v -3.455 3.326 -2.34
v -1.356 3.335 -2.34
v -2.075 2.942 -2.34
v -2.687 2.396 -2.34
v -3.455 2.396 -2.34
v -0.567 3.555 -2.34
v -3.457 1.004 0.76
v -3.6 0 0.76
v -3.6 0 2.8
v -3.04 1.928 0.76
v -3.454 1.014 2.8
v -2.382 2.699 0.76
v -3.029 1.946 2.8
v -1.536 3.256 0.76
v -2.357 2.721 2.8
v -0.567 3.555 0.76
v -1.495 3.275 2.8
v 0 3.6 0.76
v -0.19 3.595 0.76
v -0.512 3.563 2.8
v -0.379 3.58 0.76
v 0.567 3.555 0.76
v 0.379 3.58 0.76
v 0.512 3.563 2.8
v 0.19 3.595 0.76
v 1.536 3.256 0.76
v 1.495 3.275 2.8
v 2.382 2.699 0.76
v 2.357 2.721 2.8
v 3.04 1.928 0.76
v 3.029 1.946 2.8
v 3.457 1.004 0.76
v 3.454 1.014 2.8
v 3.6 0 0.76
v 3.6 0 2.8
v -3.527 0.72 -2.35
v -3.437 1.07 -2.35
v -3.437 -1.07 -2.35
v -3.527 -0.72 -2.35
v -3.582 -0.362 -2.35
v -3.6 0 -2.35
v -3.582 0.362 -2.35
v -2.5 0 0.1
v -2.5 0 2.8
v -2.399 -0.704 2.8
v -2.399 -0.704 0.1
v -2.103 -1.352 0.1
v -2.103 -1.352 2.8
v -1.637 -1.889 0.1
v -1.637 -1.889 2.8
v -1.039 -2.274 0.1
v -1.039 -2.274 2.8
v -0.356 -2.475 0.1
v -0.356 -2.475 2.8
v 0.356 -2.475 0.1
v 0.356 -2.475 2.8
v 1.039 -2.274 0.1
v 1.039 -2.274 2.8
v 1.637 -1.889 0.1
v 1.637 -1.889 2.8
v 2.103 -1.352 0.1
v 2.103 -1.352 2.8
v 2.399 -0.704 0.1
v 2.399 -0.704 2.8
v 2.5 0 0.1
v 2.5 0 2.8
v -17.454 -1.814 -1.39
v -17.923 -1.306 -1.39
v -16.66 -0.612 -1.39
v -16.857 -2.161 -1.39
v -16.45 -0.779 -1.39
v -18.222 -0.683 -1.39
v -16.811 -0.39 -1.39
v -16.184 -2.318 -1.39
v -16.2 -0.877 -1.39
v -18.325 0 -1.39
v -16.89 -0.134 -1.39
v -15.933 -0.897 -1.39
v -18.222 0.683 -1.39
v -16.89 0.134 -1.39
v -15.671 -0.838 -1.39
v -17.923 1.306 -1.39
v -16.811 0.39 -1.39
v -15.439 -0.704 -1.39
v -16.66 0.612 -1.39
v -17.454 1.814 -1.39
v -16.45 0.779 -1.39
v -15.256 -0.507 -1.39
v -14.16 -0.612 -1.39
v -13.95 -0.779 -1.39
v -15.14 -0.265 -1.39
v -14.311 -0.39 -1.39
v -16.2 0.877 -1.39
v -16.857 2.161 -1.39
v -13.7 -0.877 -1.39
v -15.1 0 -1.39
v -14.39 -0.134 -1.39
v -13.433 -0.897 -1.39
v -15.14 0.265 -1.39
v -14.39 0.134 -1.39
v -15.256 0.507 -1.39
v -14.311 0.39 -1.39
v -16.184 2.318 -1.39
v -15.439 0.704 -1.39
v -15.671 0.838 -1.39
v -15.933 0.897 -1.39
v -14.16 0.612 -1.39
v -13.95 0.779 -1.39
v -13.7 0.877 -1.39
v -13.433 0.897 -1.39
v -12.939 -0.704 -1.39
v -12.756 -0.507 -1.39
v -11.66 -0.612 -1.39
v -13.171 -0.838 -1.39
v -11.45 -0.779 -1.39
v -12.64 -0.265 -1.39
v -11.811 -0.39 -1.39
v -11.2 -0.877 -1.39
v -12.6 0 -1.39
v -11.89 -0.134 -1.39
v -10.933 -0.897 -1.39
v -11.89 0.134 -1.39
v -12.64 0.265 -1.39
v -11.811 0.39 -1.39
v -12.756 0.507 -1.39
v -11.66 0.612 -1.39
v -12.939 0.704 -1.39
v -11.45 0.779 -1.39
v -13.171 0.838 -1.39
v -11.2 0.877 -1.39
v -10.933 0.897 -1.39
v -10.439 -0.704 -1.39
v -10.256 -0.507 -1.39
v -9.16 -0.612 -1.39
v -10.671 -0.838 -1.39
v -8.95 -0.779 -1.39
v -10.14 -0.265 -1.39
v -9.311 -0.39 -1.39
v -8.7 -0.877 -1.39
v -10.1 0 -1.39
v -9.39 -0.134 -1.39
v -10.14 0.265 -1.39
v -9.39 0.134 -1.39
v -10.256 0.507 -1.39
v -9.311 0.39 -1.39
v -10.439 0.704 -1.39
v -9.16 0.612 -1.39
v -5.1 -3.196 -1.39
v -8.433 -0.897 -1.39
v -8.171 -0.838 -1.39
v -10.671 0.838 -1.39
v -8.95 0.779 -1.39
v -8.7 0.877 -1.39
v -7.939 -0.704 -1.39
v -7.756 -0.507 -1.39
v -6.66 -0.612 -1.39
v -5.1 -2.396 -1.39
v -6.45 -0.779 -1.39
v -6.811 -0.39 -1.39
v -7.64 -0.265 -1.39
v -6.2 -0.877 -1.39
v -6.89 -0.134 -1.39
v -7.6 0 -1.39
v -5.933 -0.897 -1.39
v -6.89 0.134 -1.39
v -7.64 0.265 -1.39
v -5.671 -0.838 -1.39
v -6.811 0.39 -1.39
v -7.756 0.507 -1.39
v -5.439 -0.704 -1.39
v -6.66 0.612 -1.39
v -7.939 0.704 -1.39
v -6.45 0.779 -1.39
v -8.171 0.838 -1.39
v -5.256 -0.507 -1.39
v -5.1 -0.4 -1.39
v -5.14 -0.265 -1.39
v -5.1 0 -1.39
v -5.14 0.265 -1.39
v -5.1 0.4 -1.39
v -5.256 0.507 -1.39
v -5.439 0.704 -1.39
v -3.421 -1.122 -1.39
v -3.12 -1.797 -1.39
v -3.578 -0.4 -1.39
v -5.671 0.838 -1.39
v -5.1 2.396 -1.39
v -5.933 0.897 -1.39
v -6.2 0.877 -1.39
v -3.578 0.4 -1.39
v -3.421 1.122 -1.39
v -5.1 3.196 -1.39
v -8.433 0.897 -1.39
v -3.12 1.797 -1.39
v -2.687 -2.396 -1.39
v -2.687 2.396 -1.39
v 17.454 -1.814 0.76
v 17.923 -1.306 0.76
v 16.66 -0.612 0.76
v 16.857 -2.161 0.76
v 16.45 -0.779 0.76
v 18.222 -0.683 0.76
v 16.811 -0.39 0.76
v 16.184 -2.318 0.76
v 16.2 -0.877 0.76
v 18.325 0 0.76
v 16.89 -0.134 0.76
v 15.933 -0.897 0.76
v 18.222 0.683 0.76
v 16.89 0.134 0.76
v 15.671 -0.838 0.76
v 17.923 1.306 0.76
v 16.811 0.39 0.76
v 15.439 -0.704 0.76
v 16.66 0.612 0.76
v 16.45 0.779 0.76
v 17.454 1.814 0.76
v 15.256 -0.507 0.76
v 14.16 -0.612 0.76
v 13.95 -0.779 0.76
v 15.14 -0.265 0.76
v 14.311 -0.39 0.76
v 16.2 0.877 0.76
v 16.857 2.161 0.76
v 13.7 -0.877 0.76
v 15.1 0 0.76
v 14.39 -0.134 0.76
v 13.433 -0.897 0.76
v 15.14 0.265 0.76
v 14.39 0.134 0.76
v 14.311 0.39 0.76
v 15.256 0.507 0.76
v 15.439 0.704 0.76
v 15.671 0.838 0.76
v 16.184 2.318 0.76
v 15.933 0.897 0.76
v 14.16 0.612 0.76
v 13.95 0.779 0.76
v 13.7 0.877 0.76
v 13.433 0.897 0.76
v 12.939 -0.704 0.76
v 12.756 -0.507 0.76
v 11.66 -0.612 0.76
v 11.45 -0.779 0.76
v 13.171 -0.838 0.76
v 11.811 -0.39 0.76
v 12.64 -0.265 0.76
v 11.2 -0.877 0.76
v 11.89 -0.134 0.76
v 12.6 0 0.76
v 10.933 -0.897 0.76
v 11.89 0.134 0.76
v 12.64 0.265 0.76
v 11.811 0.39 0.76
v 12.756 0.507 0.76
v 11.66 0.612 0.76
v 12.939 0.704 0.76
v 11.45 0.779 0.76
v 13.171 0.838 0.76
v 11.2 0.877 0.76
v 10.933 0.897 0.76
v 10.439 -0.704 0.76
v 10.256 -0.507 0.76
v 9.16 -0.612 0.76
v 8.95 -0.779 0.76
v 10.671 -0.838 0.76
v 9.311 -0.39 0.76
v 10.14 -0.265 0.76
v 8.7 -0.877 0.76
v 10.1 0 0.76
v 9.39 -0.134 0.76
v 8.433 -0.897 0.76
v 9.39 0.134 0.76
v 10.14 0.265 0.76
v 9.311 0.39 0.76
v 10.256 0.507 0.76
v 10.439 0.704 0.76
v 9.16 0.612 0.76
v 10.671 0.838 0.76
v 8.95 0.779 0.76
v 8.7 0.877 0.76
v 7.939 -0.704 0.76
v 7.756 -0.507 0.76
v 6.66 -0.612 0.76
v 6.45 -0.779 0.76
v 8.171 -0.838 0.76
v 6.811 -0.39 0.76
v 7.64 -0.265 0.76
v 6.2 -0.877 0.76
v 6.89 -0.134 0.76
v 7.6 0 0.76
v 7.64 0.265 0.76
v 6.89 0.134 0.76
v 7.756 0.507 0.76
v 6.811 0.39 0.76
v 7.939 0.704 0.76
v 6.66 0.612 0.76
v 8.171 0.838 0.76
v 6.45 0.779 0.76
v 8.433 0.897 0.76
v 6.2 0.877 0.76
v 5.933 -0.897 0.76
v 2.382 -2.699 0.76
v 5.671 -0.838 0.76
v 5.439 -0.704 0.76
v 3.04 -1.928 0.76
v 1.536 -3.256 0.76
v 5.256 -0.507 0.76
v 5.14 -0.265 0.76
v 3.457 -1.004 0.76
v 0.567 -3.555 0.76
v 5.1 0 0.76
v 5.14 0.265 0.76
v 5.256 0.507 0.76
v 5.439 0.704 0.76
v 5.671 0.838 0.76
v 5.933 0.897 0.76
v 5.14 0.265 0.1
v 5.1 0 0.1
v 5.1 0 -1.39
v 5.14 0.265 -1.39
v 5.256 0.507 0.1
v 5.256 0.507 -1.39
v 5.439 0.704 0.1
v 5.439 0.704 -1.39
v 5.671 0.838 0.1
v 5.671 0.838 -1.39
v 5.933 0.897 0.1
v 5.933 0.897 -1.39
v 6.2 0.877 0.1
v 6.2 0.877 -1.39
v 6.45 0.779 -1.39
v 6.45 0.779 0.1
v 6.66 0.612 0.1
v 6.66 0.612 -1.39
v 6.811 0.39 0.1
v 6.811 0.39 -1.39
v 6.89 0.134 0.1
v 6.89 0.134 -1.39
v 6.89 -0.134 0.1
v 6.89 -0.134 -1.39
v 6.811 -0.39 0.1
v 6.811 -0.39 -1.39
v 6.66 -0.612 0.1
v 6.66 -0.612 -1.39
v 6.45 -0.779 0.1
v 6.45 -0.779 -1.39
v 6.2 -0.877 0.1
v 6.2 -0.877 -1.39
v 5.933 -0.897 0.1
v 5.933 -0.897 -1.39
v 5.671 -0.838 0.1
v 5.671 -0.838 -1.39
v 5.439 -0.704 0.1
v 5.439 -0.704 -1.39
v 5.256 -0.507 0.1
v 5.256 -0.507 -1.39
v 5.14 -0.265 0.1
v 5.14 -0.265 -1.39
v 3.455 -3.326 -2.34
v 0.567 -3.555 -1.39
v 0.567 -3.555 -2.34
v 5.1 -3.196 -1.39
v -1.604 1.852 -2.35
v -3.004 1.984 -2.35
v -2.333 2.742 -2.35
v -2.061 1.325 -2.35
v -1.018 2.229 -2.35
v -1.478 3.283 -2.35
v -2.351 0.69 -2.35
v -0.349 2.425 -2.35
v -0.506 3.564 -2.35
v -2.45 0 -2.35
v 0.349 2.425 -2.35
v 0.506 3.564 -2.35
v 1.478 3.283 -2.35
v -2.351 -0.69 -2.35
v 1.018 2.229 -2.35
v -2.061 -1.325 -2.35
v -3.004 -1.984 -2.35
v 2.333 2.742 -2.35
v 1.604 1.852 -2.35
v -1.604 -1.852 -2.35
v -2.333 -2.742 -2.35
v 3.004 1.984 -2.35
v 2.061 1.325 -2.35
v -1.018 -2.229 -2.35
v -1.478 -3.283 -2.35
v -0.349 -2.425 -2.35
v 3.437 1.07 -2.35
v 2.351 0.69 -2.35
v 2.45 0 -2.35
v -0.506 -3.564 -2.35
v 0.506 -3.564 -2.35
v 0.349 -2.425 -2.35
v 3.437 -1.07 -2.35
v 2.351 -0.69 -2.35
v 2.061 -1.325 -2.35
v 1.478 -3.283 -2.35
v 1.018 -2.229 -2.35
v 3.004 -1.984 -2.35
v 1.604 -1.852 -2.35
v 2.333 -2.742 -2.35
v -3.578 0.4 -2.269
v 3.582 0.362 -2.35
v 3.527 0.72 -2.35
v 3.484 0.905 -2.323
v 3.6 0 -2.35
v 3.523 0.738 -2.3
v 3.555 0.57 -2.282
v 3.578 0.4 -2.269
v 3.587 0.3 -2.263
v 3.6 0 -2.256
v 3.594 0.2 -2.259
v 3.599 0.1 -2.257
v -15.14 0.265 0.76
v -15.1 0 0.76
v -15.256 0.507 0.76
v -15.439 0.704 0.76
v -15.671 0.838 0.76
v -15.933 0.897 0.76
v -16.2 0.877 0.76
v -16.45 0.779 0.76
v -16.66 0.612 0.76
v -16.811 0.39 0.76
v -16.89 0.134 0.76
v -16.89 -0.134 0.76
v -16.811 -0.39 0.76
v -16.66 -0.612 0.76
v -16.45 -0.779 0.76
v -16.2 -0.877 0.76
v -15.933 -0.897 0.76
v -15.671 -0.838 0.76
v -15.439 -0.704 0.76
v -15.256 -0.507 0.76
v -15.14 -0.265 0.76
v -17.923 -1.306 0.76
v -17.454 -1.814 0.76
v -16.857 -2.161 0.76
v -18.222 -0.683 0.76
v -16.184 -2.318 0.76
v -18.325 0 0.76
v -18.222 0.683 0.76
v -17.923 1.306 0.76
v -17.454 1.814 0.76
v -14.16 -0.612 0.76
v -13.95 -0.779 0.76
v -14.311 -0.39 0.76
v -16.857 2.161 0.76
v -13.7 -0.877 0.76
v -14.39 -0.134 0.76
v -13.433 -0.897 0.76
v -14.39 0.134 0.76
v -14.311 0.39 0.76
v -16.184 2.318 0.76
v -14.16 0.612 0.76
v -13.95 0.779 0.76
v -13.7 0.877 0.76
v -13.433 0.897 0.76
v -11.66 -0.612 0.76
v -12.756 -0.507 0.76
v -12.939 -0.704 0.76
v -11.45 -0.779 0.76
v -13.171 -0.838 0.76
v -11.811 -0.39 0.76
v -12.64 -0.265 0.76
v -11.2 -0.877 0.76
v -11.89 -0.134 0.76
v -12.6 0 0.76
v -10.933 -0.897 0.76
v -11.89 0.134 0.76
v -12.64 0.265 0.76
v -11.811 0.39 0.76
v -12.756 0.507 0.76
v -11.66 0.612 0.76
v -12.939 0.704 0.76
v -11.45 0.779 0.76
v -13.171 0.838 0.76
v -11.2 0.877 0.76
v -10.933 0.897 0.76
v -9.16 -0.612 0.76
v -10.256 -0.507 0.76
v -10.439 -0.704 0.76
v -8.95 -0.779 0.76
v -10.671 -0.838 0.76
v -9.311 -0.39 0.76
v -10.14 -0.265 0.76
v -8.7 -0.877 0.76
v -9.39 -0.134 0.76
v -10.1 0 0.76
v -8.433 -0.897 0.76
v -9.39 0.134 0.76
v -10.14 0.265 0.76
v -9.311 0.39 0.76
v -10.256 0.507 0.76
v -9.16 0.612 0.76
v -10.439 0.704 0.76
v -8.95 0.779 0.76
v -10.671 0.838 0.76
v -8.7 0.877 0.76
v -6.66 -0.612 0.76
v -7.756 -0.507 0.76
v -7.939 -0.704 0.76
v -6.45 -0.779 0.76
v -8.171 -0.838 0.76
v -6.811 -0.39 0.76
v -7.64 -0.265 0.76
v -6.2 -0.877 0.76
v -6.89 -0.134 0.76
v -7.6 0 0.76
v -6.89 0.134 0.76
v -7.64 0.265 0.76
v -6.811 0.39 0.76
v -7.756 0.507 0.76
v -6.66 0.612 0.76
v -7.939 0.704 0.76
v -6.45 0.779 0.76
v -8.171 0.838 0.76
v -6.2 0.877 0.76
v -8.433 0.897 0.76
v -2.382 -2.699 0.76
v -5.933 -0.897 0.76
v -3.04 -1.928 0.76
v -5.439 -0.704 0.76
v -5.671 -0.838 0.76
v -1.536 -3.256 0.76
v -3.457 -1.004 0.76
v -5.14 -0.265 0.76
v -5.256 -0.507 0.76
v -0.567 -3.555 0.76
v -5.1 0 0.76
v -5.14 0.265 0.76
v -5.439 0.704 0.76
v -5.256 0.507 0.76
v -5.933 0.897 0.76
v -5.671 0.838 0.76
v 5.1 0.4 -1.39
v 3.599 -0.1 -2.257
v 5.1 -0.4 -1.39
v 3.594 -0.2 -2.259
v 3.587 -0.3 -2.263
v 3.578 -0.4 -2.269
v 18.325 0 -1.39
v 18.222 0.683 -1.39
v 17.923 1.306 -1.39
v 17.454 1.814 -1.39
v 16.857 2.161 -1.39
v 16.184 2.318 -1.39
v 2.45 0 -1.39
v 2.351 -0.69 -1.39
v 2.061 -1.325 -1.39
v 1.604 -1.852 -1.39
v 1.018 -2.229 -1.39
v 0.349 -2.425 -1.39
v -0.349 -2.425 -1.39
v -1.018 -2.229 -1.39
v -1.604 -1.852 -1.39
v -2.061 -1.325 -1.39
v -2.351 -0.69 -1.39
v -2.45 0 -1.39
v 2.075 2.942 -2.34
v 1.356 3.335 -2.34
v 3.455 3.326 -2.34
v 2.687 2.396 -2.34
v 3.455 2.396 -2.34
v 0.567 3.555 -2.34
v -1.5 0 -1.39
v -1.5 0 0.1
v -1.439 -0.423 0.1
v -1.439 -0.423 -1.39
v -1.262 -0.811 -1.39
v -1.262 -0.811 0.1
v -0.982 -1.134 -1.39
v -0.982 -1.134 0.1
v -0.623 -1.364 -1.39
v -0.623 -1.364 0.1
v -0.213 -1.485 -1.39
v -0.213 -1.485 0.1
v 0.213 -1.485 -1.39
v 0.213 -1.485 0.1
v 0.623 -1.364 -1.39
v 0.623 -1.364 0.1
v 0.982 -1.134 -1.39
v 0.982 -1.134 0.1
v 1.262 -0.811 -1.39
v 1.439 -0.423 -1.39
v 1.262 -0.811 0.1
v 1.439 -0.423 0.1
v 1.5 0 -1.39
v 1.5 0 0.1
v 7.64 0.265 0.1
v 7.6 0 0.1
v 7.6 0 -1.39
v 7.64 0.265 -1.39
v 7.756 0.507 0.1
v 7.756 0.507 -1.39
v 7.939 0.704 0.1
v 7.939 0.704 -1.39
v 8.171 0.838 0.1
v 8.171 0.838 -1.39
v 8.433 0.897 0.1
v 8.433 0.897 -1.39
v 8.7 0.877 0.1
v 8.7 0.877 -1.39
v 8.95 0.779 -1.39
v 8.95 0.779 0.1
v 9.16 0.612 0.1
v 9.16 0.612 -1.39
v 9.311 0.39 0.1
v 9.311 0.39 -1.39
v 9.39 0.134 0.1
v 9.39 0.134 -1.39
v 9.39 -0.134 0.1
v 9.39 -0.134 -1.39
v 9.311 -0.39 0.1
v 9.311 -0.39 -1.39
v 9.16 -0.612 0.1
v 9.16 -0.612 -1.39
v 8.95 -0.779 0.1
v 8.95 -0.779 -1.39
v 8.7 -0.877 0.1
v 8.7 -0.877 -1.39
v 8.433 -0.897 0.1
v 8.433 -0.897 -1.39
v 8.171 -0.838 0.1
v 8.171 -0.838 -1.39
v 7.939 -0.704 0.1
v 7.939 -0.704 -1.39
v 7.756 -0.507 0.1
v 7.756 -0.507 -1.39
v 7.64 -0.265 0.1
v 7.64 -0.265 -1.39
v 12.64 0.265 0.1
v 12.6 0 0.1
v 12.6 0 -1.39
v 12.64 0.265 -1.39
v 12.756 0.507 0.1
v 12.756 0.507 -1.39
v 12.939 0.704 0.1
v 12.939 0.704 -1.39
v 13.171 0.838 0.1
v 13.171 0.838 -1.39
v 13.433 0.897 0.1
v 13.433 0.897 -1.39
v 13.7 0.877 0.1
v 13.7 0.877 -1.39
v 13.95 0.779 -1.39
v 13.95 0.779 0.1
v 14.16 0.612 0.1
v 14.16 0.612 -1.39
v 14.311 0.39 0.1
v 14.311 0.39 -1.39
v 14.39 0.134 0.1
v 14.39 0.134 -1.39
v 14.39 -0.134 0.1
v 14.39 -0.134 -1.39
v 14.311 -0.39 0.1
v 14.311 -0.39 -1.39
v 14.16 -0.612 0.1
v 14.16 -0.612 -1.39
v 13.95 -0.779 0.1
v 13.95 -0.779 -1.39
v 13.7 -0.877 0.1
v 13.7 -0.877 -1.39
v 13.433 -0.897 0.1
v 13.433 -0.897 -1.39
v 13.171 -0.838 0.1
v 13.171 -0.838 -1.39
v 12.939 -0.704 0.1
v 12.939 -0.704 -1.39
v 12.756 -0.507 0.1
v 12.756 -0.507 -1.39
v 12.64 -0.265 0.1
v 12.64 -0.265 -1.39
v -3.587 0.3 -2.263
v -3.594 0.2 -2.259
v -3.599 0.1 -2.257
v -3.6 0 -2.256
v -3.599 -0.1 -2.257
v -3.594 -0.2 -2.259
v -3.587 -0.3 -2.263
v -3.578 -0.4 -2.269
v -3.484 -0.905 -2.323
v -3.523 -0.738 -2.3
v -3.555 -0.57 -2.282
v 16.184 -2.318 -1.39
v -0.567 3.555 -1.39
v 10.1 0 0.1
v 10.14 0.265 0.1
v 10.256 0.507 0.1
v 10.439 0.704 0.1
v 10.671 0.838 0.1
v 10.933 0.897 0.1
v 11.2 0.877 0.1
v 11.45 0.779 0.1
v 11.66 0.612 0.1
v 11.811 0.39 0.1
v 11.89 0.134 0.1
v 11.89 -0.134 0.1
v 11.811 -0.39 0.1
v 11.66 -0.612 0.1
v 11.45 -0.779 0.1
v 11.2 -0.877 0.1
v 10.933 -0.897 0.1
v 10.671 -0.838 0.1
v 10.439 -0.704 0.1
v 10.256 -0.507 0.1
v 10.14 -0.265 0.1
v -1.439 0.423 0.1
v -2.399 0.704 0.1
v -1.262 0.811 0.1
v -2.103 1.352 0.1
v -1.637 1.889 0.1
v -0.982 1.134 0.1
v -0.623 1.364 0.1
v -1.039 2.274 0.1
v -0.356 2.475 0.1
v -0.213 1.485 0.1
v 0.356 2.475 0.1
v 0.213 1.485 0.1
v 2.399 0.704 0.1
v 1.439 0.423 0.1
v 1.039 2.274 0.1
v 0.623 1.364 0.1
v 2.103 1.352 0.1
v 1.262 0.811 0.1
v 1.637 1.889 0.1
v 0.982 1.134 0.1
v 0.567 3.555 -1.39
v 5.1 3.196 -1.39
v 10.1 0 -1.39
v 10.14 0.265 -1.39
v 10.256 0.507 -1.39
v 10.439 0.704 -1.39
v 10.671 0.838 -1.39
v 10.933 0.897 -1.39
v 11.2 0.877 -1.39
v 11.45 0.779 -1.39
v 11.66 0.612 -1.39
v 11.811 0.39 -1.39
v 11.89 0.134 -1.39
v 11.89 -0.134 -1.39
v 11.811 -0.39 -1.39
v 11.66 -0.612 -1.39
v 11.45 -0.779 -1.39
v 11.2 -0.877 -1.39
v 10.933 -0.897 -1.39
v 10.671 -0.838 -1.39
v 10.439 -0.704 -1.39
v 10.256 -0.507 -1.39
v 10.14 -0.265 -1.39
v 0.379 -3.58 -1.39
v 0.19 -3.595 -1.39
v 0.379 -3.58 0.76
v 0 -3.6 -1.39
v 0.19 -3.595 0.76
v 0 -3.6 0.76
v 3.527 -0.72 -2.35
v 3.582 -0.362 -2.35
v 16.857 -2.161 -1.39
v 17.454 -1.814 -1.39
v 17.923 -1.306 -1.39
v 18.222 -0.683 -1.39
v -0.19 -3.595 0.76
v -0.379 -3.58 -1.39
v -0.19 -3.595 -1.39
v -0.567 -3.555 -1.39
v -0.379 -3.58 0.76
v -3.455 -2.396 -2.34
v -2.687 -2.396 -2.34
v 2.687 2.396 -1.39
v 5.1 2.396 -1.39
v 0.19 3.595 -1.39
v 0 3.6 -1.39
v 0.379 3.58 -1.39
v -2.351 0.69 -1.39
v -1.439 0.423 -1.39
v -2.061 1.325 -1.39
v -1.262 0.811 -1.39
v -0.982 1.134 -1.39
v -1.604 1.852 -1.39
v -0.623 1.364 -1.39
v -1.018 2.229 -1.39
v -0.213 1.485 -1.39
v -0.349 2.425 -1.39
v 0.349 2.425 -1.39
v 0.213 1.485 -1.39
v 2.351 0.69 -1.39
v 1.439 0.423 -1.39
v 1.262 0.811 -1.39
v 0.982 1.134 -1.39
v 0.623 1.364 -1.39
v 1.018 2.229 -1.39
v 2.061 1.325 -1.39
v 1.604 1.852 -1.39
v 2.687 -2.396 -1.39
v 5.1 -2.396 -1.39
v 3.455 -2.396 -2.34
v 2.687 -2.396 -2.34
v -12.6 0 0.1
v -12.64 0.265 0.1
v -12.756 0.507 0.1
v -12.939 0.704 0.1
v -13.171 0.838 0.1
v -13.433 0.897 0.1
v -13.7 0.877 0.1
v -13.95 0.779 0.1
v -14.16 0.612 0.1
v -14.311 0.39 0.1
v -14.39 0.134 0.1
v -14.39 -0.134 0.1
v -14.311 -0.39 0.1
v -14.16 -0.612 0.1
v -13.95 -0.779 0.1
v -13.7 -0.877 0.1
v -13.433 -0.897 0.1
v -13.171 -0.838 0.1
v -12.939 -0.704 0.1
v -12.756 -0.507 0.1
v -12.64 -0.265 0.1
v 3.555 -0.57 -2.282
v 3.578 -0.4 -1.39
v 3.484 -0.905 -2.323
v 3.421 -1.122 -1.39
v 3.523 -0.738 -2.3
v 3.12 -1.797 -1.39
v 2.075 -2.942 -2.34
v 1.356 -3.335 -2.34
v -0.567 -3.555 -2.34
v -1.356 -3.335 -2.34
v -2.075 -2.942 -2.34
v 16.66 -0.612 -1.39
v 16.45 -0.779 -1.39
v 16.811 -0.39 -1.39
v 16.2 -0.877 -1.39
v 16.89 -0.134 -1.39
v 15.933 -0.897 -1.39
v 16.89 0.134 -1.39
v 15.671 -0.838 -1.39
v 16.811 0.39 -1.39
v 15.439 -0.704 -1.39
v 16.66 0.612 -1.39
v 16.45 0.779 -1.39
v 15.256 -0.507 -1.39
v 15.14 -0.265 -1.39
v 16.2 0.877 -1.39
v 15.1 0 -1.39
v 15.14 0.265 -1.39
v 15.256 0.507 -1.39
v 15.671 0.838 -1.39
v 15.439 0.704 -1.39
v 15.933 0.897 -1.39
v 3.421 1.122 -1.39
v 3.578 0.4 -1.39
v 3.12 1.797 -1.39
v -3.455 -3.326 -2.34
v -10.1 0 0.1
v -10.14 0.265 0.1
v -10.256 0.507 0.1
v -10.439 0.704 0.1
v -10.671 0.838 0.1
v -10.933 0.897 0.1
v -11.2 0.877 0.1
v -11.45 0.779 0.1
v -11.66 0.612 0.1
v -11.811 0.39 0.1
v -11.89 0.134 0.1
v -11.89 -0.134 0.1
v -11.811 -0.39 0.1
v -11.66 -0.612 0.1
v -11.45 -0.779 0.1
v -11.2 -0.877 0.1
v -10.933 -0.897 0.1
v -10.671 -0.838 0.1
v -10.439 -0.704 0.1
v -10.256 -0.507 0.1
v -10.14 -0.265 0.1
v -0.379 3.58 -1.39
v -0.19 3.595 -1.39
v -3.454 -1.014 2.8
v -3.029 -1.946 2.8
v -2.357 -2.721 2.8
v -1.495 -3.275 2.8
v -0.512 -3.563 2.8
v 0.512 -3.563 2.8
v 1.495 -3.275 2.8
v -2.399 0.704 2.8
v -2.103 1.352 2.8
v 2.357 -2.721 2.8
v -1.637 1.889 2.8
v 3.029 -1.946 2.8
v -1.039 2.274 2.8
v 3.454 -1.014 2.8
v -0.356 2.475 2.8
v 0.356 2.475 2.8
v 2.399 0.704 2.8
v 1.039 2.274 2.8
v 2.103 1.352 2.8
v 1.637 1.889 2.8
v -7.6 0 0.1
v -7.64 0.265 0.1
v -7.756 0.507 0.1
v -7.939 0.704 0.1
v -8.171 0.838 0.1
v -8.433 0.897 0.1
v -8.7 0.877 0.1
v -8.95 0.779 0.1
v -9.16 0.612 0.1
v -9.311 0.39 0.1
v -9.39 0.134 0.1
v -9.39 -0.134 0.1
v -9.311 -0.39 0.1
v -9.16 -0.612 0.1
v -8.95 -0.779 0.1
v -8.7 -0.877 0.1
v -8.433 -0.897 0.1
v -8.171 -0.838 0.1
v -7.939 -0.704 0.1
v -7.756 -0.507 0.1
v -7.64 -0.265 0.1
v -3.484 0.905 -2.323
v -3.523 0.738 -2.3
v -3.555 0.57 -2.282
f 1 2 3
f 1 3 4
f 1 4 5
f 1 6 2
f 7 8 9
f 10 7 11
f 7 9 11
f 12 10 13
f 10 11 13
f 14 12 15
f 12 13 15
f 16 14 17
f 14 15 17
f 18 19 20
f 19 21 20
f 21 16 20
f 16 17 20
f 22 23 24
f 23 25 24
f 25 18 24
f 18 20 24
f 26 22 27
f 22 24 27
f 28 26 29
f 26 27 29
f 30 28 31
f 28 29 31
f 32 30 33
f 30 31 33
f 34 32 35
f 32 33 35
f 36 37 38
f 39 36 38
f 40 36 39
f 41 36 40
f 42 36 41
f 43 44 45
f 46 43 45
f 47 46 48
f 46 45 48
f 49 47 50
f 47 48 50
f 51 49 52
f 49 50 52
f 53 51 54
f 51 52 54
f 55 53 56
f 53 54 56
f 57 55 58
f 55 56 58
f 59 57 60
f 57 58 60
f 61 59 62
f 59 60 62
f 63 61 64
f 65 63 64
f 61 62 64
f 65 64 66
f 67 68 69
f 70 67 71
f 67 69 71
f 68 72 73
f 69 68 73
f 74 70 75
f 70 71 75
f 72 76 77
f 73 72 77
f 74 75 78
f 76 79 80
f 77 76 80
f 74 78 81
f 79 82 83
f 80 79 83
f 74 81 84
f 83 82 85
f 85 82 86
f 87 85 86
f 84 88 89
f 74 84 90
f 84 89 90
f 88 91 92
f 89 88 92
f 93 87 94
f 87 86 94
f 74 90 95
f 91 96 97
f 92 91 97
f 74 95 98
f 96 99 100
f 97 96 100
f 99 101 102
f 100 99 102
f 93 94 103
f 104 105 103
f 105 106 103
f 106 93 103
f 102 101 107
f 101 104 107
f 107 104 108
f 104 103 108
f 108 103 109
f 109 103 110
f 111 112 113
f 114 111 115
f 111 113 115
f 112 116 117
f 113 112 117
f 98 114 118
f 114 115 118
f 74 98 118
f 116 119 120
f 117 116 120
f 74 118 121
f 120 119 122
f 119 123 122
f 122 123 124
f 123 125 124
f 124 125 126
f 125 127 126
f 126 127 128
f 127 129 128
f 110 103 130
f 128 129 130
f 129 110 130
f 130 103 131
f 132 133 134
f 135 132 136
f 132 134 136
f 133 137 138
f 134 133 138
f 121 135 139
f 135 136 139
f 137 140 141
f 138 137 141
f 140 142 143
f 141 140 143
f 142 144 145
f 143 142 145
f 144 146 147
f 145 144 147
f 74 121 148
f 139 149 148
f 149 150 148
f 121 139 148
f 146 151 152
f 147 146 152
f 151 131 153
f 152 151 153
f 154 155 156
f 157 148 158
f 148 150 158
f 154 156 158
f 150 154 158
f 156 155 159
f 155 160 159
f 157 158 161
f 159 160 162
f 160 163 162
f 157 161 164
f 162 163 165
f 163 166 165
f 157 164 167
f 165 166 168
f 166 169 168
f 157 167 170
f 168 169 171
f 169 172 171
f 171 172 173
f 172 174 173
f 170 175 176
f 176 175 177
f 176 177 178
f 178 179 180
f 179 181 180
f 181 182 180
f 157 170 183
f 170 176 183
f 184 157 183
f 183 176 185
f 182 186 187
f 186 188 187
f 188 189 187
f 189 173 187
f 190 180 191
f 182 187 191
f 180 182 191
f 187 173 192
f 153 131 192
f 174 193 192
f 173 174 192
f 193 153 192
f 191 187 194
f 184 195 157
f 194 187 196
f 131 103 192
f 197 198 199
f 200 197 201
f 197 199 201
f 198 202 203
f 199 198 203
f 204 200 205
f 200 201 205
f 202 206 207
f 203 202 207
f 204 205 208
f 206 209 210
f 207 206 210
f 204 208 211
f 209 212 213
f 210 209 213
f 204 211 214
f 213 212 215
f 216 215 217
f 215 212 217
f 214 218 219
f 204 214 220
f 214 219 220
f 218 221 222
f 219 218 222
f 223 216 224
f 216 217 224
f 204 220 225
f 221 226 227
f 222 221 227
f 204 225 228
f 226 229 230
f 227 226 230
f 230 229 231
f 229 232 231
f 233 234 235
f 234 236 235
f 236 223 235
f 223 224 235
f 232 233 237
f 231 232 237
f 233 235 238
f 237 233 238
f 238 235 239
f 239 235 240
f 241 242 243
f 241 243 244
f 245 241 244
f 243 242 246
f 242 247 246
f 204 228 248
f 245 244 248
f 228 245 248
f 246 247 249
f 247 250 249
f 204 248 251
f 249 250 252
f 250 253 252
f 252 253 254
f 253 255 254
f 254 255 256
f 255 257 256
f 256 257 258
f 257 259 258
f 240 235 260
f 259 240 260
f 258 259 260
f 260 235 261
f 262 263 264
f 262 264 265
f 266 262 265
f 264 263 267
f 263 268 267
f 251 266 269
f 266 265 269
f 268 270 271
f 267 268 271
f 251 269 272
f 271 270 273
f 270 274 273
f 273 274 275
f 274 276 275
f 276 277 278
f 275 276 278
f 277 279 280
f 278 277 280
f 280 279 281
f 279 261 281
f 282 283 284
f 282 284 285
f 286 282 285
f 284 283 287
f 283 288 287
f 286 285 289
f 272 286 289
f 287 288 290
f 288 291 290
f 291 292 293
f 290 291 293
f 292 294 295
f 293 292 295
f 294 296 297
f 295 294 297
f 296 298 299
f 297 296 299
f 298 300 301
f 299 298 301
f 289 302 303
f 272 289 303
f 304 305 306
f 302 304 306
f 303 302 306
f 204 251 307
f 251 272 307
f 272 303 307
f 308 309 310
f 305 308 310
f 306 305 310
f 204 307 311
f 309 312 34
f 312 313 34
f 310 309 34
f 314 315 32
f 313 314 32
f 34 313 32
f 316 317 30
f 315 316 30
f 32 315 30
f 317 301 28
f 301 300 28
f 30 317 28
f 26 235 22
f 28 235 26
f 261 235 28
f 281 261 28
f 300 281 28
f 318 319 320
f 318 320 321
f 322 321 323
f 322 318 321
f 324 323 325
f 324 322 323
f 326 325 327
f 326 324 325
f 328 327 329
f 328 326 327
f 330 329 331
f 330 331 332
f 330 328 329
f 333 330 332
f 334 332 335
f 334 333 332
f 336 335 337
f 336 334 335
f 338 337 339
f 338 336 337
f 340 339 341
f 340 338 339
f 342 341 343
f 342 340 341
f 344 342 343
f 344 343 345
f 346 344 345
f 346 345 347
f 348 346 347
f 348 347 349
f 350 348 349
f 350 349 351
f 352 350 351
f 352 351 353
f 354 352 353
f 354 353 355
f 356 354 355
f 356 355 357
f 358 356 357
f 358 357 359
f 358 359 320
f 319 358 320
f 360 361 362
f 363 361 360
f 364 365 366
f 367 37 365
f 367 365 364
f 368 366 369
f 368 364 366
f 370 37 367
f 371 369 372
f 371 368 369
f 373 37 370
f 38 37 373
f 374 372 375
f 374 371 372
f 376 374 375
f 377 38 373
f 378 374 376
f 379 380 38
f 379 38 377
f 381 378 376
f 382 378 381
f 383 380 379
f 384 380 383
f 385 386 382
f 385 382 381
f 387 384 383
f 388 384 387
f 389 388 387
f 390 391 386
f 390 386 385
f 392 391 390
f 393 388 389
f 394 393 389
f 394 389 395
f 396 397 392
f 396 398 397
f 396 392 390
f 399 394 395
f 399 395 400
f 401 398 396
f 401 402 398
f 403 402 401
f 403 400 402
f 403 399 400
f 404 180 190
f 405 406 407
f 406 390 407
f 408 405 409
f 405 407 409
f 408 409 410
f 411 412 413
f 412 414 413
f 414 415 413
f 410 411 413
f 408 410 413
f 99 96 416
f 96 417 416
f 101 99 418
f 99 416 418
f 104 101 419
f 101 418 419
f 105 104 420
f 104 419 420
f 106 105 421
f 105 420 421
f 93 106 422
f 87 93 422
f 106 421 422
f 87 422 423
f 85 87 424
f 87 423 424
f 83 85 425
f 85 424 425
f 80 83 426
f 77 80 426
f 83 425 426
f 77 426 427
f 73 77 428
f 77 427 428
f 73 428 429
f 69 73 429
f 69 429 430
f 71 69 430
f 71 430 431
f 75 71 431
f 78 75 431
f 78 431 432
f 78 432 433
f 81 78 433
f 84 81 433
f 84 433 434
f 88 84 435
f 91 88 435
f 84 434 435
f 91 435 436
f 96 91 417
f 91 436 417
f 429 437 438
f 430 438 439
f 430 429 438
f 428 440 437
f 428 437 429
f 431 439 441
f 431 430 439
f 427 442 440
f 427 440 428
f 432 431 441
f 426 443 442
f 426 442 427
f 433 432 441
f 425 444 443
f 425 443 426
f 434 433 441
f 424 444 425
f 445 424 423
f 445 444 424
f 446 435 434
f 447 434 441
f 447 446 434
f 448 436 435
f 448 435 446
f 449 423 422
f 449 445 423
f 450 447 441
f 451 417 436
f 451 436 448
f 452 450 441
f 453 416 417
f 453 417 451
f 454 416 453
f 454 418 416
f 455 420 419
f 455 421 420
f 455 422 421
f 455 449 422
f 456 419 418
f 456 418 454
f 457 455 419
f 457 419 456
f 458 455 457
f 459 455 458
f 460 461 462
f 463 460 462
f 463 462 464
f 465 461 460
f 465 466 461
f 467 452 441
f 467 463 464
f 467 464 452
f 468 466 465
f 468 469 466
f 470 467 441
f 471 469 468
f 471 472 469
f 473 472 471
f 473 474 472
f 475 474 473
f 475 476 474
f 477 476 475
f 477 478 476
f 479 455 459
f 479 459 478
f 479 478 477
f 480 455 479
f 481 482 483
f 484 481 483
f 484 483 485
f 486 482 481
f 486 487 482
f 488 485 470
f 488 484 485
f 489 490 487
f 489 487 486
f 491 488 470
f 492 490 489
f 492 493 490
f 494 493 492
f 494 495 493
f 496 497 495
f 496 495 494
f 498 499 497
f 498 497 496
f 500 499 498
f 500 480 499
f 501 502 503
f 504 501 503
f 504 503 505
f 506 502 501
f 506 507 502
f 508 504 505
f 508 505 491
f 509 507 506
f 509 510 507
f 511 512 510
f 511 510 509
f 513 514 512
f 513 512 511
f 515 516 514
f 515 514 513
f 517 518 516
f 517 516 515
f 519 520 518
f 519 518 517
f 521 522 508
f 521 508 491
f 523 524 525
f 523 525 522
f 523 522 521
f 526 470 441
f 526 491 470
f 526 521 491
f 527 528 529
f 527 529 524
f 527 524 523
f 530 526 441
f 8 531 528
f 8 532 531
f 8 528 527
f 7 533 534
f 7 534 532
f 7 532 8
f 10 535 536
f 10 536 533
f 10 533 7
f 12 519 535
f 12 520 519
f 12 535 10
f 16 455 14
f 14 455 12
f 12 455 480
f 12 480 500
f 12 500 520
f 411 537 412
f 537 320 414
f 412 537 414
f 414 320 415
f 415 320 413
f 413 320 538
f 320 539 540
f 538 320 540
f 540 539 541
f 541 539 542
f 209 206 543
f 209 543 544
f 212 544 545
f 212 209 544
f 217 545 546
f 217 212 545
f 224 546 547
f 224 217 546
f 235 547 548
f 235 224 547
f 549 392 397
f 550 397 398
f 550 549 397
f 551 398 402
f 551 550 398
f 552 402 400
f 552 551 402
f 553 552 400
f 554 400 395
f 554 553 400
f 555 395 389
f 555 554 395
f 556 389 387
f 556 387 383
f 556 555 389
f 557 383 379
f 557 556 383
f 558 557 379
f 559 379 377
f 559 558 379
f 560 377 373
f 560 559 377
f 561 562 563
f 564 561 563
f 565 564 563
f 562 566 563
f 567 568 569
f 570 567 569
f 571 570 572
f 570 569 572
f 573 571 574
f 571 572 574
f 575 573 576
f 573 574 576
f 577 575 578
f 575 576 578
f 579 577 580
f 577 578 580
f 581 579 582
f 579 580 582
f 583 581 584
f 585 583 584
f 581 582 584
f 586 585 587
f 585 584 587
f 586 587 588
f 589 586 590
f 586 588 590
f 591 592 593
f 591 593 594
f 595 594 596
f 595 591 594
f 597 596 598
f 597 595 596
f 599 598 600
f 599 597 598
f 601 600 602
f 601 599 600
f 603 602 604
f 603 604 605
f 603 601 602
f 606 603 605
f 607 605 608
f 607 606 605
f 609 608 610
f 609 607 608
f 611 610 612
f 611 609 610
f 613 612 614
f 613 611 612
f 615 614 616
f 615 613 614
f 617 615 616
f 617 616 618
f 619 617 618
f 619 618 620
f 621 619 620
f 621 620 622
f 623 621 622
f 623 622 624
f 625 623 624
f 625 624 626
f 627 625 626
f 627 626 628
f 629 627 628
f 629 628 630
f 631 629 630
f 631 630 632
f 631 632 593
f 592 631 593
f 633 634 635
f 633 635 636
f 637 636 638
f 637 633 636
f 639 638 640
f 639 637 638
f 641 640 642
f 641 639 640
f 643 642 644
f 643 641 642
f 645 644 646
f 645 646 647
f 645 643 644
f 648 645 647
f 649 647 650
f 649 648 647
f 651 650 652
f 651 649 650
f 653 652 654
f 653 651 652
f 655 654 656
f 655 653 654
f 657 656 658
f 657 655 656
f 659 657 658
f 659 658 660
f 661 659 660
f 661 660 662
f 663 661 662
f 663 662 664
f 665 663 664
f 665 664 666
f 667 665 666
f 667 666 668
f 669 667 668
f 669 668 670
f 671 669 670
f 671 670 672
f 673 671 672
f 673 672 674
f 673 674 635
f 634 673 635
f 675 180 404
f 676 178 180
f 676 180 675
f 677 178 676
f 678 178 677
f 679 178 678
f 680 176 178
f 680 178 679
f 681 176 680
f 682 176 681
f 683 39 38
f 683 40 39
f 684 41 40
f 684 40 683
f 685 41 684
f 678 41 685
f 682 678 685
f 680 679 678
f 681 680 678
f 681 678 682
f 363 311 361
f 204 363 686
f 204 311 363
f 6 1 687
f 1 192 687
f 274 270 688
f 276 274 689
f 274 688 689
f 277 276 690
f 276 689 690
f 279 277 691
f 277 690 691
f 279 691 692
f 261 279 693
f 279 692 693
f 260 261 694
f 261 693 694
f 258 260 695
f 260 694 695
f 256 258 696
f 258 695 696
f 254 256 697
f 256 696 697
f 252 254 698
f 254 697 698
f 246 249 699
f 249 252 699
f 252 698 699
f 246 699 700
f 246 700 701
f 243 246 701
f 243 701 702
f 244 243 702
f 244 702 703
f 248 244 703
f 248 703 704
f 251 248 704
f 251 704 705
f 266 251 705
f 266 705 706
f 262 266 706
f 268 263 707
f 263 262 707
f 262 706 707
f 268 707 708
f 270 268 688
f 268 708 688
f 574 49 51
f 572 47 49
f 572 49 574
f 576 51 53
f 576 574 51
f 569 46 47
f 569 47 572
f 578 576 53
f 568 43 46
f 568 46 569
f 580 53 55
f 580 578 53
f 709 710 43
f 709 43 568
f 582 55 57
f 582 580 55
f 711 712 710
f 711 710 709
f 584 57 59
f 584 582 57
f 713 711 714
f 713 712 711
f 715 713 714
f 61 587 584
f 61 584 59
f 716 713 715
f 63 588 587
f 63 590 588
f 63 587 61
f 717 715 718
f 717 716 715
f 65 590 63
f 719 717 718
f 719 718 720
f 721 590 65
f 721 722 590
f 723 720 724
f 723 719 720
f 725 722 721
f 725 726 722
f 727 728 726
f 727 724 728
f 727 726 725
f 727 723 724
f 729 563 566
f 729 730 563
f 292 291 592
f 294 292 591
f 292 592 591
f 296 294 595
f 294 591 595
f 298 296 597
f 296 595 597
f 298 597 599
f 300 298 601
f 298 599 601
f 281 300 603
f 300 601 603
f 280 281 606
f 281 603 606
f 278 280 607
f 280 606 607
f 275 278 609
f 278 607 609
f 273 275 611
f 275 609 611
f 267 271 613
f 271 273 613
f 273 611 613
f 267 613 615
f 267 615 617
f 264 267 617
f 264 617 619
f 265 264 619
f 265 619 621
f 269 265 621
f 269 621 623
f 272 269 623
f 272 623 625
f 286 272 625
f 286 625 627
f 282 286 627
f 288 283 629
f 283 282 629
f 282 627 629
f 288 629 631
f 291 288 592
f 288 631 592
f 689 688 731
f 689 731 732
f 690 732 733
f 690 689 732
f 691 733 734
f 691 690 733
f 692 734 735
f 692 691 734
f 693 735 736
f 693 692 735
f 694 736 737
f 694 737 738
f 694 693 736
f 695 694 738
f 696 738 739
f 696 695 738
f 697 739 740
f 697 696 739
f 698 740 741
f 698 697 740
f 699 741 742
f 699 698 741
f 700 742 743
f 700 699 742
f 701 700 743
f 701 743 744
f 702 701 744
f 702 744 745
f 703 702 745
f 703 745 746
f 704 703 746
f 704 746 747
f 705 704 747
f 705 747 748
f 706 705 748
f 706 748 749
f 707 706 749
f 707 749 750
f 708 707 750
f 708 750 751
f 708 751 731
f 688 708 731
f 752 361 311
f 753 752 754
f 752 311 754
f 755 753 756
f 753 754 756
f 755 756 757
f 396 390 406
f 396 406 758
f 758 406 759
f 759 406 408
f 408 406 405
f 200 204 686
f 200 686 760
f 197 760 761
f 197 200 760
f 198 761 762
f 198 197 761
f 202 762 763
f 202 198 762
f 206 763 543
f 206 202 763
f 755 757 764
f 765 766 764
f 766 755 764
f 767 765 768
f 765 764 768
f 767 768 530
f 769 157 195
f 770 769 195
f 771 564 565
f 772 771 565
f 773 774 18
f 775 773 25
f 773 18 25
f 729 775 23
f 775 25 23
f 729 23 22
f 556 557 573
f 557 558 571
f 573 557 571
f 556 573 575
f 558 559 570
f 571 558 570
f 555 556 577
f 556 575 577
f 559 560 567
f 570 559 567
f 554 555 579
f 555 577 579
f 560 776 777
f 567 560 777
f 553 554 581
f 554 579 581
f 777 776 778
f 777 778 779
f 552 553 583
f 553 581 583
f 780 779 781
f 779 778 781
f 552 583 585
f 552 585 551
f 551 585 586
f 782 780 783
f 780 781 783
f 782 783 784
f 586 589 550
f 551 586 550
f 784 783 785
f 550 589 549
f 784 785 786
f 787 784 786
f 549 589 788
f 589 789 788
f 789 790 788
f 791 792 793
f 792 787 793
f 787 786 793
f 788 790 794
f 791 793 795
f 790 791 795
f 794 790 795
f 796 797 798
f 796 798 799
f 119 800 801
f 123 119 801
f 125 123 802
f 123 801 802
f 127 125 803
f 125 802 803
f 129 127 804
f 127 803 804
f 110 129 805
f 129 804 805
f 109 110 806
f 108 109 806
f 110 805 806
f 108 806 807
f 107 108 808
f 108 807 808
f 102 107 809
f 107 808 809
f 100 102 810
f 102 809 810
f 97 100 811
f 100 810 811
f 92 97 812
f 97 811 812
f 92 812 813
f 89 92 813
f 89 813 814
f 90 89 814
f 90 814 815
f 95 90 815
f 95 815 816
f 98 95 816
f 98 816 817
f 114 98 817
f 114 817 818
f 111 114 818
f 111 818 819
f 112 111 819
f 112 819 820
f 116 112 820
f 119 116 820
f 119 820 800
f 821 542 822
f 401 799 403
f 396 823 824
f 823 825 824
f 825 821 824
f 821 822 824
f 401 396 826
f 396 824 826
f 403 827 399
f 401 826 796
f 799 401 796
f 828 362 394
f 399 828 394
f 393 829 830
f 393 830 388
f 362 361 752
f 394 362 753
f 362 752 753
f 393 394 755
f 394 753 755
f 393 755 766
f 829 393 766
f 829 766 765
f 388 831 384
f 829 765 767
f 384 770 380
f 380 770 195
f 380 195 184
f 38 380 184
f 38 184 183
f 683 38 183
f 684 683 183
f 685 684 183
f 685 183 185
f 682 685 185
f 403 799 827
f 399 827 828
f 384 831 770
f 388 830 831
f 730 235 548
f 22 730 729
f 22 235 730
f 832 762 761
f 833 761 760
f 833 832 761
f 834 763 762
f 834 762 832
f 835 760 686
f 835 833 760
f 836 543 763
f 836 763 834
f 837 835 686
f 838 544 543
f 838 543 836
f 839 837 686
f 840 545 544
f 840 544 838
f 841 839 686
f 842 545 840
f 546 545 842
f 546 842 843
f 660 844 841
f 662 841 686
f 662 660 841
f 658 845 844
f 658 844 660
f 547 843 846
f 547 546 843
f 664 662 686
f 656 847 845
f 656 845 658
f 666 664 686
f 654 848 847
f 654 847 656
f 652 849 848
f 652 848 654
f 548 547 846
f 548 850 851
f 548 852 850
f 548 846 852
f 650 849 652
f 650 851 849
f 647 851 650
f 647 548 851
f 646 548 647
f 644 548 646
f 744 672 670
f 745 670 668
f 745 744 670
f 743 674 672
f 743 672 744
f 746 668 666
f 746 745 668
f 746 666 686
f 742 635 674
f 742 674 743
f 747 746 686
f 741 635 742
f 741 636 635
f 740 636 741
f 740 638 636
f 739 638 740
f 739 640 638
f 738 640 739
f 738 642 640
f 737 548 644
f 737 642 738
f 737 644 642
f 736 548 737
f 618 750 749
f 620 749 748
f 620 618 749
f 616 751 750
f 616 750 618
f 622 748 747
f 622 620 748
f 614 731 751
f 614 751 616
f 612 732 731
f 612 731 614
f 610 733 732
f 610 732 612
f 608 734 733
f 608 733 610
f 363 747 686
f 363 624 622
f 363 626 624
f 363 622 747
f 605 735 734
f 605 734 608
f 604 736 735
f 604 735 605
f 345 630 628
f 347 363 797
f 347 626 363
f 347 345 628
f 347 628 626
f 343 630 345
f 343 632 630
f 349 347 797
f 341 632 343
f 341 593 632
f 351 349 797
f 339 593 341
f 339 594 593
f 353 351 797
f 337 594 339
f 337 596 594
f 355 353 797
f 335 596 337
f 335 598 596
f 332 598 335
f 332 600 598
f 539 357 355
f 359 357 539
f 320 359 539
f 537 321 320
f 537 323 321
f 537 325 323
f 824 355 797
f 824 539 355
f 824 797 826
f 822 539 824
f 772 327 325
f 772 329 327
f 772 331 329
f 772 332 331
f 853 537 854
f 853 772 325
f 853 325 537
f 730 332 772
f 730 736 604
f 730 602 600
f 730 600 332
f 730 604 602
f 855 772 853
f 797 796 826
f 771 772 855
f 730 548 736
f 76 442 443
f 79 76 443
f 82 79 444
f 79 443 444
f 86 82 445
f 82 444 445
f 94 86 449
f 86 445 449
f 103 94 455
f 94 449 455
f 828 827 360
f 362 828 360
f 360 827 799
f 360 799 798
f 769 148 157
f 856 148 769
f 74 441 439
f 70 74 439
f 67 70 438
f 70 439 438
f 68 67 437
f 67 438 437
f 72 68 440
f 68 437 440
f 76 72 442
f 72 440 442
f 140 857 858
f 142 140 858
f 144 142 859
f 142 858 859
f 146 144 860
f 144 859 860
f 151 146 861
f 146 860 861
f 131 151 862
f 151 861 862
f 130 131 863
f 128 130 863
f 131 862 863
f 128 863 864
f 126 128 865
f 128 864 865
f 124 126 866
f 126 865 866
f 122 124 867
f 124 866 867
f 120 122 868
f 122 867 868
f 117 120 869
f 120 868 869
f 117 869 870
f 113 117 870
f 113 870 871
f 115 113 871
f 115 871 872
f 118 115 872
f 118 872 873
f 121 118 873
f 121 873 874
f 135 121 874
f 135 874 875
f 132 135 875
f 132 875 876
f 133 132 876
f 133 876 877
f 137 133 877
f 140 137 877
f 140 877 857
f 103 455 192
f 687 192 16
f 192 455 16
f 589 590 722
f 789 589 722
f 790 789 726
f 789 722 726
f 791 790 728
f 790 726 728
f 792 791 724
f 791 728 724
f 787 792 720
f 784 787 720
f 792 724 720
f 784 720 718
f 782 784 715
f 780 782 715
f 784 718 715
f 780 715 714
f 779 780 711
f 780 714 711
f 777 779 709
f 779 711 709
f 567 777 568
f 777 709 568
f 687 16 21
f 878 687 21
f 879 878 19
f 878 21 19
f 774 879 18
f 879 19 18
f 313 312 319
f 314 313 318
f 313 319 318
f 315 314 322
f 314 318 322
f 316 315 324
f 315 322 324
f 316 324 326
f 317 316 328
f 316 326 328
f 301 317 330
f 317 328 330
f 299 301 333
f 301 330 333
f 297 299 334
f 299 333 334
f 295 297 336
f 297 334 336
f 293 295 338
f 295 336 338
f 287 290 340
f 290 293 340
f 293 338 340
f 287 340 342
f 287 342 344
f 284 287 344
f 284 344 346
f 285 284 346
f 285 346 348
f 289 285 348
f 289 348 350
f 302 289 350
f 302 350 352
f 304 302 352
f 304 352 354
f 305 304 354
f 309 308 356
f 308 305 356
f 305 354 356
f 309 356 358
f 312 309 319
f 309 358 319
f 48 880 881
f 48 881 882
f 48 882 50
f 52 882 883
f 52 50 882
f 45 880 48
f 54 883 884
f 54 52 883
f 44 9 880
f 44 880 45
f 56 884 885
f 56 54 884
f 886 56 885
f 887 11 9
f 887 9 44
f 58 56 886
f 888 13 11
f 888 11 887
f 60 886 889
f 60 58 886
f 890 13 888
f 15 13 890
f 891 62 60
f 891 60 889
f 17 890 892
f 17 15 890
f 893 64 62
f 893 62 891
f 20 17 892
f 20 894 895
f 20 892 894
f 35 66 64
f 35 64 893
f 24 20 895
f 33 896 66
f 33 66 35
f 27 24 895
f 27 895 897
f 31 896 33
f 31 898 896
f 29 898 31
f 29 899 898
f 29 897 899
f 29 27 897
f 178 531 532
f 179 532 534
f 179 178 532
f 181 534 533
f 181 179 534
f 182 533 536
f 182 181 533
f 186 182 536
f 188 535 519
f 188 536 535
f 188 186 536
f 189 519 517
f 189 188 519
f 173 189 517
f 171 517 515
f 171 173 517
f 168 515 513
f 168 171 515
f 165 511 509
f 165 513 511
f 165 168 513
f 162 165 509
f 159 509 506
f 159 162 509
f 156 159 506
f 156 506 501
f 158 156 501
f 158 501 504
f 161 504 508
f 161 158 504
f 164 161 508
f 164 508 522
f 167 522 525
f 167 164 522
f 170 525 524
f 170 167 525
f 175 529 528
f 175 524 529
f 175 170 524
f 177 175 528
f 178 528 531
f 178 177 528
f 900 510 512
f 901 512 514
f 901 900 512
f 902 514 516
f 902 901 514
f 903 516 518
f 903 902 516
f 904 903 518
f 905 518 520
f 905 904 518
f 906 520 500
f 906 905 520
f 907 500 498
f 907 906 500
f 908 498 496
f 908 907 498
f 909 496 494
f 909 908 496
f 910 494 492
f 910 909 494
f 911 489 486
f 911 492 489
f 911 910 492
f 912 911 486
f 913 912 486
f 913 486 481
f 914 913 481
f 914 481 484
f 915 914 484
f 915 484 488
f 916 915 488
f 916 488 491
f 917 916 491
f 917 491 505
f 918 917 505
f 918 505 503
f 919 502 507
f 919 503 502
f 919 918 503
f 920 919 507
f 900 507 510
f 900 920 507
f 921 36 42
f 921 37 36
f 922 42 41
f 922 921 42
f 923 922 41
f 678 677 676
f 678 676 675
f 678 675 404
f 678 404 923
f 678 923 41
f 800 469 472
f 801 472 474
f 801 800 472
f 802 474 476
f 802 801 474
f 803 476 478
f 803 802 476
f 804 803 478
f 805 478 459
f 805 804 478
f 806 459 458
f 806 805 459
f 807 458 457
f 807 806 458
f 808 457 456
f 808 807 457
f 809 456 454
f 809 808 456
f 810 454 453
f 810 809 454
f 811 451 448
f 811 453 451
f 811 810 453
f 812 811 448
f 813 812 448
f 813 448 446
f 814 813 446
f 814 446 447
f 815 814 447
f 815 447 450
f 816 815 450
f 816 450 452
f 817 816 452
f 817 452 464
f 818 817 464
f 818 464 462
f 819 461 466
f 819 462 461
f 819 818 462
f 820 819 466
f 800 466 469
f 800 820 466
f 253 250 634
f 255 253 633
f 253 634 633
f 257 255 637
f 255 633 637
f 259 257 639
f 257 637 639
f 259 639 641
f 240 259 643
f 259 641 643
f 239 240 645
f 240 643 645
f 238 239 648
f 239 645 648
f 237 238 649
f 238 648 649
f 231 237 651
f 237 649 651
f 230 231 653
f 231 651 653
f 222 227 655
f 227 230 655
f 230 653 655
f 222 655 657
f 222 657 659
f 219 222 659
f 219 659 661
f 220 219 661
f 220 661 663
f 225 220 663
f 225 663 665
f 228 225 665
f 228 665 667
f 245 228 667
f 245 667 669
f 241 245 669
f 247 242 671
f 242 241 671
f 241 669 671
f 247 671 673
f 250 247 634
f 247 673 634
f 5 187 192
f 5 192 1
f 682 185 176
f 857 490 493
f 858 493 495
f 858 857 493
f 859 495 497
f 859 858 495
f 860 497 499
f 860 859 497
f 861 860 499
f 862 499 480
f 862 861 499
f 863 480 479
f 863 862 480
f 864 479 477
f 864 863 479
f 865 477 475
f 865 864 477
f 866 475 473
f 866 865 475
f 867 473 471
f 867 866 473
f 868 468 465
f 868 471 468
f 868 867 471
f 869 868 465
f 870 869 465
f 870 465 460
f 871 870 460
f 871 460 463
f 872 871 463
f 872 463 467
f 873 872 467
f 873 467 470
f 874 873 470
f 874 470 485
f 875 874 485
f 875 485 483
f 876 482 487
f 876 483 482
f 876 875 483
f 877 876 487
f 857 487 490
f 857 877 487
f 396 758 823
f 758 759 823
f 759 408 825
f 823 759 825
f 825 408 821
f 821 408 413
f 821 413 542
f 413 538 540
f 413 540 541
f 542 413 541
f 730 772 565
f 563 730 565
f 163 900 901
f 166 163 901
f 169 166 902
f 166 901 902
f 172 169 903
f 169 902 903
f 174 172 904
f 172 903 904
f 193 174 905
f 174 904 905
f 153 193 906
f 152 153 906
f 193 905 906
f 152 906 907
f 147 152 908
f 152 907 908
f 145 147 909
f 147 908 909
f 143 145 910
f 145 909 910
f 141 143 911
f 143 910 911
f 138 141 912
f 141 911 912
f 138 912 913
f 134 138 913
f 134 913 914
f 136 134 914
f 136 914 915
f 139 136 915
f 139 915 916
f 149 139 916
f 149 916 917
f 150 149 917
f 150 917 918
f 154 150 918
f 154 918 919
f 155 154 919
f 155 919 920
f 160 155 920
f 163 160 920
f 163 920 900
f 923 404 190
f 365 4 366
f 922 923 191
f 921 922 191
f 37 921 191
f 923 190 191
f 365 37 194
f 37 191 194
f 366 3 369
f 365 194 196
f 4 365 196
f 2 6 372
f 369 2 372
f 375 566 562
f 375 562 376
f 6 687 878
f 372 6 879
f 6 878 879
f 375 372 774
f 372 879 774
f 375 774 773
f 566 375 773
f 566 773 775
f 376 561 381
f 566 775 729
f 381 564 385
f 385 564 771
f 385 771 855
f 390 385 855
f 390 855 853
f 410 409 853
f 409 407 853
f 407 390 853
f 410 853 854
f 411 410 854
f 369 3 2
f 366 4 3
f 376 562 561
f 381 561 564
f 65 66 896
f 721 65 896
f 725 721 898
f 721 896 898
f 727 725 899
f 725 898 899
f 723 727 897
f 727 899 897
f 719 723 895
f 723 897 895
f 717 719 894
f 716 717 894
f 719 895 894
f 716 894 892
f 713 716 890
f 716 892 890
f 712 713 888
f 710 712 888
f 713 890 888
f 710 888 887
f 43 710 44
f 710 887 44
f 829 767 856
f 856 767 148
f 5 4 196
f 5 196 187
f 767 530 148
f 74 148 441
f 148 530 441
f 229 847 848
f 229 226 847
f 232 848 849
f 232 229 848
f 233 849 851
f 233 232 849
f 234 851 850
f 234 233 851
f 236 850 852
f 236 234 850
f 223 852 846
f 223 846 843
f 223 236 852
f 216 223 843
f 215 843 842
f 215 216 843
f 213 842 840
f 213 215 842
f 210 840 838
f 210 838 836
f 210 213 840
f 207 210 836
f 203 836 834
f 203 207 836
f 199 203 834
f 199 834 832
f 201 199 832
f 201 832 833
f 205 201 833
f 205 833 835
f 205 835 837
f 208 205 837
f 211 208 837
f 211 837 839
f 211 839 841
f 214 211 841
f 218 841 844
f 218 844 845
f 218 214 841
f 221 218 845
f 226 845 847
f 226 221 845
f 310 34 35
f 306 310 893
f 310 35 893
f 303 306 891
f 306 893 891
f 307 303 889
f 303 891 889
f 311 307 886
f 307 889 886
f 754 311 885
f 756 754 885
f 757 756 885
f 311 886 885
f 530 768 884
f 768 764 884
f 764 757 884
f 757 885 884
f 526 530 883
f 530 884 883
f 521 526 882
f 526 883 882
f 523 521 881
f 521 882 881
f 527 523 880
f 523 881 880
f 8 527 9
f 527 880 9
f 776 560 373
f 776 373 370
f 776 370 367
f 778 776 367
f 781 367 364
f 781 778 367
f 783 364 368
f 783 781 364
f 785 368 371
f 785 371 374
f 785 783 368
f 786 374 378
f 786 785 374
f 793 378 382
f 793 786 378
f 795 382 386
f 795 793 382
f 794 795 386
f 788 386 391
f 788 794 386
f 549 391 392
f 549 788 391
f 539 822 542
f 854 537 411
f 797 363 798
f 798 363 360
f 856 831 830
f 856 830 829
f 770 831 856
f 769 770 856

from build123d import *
from build123d.topology import SkipClean

# Parameters (mm, degrees)
RESSALTO_EXTRUS_O1_DEPTH      = 2.8
RESSALTO_EXTRUS_O1_DEPTH_BACK = 0.15
ESBO_O1_R                     = 3.6
ESBO_O1_R_2                   = 2.45
ESBO_O2_R                     = 2.5
ESBO_O2_R_2                   = 1
RESSALTO_EXTRUS_O2_DEPTH      = 0.5
ESBO_O3_R                     = 3.6
ESBO_O3_R_2                   = 2.45
RESSALTO_EXTRUS_O3_DEPTH      = 2.2
ESBO_O4_W                     = 22
ESBO_O4_H                     = 2.15
RESSALTO_EXTRUS_O4_DEPTH      = 3.6
ESBO_O5_W                     = 28.099055456
ESBO_O5_H                     = 12.161315405
CORTE_EXTRUS_O2_DEPTH         = 7.2
ESBO_O7_R                     = 2.5
CORTE_EXTRUS_O3_DEPTH         = 2.7
ESBO_O8_R                     = 1.5
ESBO_O8_R_2                   = 0.9
CORTE_EXTRUS_O4_DEPTH         = 6.9
RESSALTO_EXTRUS_O5_START      = 0.95
RESSALTO_EXTRUS_O5_DEPTH      = 0.95
CORTE_EXTRUS_O5_DEPTH         = 12
CORTE_EXTRUS_O5_DEPTH_BACK    = 4.95


with BuildPart() as part:
    # Esboço1 → Ressalto-extrusão1 (new, two sides: drawn at the far end of the back side and taken through both)
    with BuildSketch(Plane.XY.offset(-RESSALTO_EXTRUS_O1_DEPTH_BACK)):
        Circle(ESBO_O1_R)
        Circle(ESBO_O1_R_2, mode=Mode.SUBTRACT)
    extrude(amount=RESSALTO_EXTRUS_O1_DEPTH + RESSALTO_EXTRUS_O1_DEPTH_BACK)



with BuildPart() as body_2:
    # Esboço2 → Ressalto-extrusão2 (new body)
    with BuildSketch(Plane(origin=(0, 0, -0.15), x_dir=(-1, 0, 0), z_dir=(0, 0, -1))):
        Circle(ESBO_O2_R)
        Circle(ESBO_O2_R_2, mode=Mode.SUBTRACT)
    extrude(amount=RESSALTO_EXTRUS_O2_DEPTH)


with BuildPart() as part_1:
    add(part.part)

    add(body_2.part)  # Ressalto-extrusão3 merges body 2
    # Esboço3 → Ressalto-extrusão3 (add)
    with BuildSketch(Plane(origin=(0, 0, -0.15), x_dir=(-1, 0, 0), z_dir=(0, 0, -1))):
        Circle(ESBO_O3_R)
        Circle(ESBO_O3_R_2, mode=Mode.SUBTRACT)
    extrude(amount=RESSALTO_EXTRUS_O3_DEPTH)

    # Esboço4 → Ressalto-extrusão4 (add, symmetric)
    with BuildSketch(Plane(origin=(0, 0, 0), x_dir=(1, 0, 0), z_dir=(0, 1, 0))):
        with Locations((-7.325, 0.315)):
            Rectangle(ESBO_O4_W, ESBO_O4_H)
    extrude(amount=RESSALTO_EXTRUS_O4_DEPTH, both=True)

    # Esboço5 → Corte-extrusão2 (cut)
    with BuildSketch(Plane.XY.offset(0.76)):
        with Locations((-8.404041895, -0.464906197)):
            Rectangle(ESBO_O5_W, ESBO_O5_H)
        with BuildLine():
            ThreePointArc((0, -3.6), (-0.28434443, -3.588753021), (-0.566912184, -3.555082358))
            Line((-0.566912184, -3.555082358), (-16.183639111, -2.317736326))
            ThreePointArc((-16.183639111, -2.317736326), (-18.325, 0), (-16.183639111, 2.317736326))
            Line((-16.183639111, 2.317736326), (-0.566912184, 3.555082358))
            ThreePointArc((-0.566912184, 3.555082358), (-0.28434443, 3.588753021), (0, 3.6))
            ThreePointArc((0, 3.6), (3.6, 0), (0, -3.6))
        make_face(mode=Mode.SUBTRACT)
    extrude(amount=-CORTE_EXTRUS_O2_DEPTH, mode=Mode.SUBTRACT)

    # Esboço7 → Corte-extrusão3 (cut)
    with BuildSketch(Plane.XY.offset(2.8)):
        Circle(ESBO_O7_R)
    extrude(amount=-CORTE_EXTRUS_O3_DEPTH, mode=Mode.SUBTRACT)

    # Esboço8 → Corte-extrusão4 (cut, symmetric)
    with BuildSketch(Plane.XY.offset(0.1)):
        Circle(ESBO_O8_R)
        with Locations((-6, 0)):
            Circle(ESBO_O8_R_2)
        with Locations((-8.5, 0)):
            Circle(ESBO_O8_R_2)
        with Locations((-11, 0)):
            Circle(ESBO_O8_R_2)
        with Locations((-13.5, 0)):
            Circle(ESBO_O8_R_2)
        with Locations((-16, 0)):
            Circle(ESBO_O8_R_2)
    extrude(amount=CORTE_EXTRUS_O4_DEPTH, both=True, mode=Mode.SUBTRACT)

    # Esboço10 → Ressalto-extrusão5 (add)
    with SkipClean():  # the faces are left unmerged after this step: merging them gives an invalid solid
        with BuildSketch(Plane(origin=(0, 0, -1.39), x_dir=(-1, 0, 0), z_dir=(0, 0, -1)).offset(RESSALTO_EXTRUS_O5_START)):
            with BuildLine():
                Line((0.566912184, -3.555082358), (5.1, -3.195916302))
                Line((5.1, -3.195916302), (5.1, -2.395916302))
                Line((5.1, -2.395916302), (2.686928558, -2.395916302))
                ThreePointArc((2.686928558, -2.395916302), (1.727074515, -3.158672763), (0.566912184, -3.555082358))
            make_face()
            with BuildLine():
                ThreePointArc((0.566912184, 3.555082358), (1.727074515, 3.158672763), (2.686928558, 2.395916302))
                Line((2.686928558, 2.395916302), (5.1, 2.395916302))
                Line((5.1, 2.395916302), (5.1, 3.195916302))
                Line((5.1, 3.195916302), (0.566912184, 3.555082358))
            make_face()
            with BuildLine():
                ThreePointArc((3.577708764, 0.4), (3.6, 0), (3.577708764, -0.4))
                Line((3.577708764, -0.4), (5.193774225, -0.4))
                ThreePointArc((5.193774225, -0.4), (5.1, 0), (5.193774225, 0.4))
                Line((5.193774225, 0.4), (3.577708764, 0.4))
            make_face()
        extrude(amount=-RESSALTO_EXTRUS_O5_DEPTH)

    # Esboço11 → Corte-extrusão5 (cut, two sides: drawn at the far end of the back side and taken through both)
    with BuildSketch(Plane(origin=(0, 0, 0), x_dir=(1, 0, 0), z_dir=(0, 1, 0)).offset(-CORTE_EXTRUS_O5_DEPTH_BACK)):
        Polygon((-5.1, 1.39), (-2.045555334, 3.15348445), (-5.859008957, 3.15348445), (-5.859008957, 1.39), align=None)
    extrude(amount=CORTE_EXTRUS_O5_DEPTH + CORTE_EXTRUS_O5_DEPTH_BACK, mode=Mode.SUBTRACT)

    # Espelhar20: part across plane


with BuildPart() as part_2:
    add(part_1.part)
    add(part_1.part.mirror(Plane.ZY))


solid = part_2.part
